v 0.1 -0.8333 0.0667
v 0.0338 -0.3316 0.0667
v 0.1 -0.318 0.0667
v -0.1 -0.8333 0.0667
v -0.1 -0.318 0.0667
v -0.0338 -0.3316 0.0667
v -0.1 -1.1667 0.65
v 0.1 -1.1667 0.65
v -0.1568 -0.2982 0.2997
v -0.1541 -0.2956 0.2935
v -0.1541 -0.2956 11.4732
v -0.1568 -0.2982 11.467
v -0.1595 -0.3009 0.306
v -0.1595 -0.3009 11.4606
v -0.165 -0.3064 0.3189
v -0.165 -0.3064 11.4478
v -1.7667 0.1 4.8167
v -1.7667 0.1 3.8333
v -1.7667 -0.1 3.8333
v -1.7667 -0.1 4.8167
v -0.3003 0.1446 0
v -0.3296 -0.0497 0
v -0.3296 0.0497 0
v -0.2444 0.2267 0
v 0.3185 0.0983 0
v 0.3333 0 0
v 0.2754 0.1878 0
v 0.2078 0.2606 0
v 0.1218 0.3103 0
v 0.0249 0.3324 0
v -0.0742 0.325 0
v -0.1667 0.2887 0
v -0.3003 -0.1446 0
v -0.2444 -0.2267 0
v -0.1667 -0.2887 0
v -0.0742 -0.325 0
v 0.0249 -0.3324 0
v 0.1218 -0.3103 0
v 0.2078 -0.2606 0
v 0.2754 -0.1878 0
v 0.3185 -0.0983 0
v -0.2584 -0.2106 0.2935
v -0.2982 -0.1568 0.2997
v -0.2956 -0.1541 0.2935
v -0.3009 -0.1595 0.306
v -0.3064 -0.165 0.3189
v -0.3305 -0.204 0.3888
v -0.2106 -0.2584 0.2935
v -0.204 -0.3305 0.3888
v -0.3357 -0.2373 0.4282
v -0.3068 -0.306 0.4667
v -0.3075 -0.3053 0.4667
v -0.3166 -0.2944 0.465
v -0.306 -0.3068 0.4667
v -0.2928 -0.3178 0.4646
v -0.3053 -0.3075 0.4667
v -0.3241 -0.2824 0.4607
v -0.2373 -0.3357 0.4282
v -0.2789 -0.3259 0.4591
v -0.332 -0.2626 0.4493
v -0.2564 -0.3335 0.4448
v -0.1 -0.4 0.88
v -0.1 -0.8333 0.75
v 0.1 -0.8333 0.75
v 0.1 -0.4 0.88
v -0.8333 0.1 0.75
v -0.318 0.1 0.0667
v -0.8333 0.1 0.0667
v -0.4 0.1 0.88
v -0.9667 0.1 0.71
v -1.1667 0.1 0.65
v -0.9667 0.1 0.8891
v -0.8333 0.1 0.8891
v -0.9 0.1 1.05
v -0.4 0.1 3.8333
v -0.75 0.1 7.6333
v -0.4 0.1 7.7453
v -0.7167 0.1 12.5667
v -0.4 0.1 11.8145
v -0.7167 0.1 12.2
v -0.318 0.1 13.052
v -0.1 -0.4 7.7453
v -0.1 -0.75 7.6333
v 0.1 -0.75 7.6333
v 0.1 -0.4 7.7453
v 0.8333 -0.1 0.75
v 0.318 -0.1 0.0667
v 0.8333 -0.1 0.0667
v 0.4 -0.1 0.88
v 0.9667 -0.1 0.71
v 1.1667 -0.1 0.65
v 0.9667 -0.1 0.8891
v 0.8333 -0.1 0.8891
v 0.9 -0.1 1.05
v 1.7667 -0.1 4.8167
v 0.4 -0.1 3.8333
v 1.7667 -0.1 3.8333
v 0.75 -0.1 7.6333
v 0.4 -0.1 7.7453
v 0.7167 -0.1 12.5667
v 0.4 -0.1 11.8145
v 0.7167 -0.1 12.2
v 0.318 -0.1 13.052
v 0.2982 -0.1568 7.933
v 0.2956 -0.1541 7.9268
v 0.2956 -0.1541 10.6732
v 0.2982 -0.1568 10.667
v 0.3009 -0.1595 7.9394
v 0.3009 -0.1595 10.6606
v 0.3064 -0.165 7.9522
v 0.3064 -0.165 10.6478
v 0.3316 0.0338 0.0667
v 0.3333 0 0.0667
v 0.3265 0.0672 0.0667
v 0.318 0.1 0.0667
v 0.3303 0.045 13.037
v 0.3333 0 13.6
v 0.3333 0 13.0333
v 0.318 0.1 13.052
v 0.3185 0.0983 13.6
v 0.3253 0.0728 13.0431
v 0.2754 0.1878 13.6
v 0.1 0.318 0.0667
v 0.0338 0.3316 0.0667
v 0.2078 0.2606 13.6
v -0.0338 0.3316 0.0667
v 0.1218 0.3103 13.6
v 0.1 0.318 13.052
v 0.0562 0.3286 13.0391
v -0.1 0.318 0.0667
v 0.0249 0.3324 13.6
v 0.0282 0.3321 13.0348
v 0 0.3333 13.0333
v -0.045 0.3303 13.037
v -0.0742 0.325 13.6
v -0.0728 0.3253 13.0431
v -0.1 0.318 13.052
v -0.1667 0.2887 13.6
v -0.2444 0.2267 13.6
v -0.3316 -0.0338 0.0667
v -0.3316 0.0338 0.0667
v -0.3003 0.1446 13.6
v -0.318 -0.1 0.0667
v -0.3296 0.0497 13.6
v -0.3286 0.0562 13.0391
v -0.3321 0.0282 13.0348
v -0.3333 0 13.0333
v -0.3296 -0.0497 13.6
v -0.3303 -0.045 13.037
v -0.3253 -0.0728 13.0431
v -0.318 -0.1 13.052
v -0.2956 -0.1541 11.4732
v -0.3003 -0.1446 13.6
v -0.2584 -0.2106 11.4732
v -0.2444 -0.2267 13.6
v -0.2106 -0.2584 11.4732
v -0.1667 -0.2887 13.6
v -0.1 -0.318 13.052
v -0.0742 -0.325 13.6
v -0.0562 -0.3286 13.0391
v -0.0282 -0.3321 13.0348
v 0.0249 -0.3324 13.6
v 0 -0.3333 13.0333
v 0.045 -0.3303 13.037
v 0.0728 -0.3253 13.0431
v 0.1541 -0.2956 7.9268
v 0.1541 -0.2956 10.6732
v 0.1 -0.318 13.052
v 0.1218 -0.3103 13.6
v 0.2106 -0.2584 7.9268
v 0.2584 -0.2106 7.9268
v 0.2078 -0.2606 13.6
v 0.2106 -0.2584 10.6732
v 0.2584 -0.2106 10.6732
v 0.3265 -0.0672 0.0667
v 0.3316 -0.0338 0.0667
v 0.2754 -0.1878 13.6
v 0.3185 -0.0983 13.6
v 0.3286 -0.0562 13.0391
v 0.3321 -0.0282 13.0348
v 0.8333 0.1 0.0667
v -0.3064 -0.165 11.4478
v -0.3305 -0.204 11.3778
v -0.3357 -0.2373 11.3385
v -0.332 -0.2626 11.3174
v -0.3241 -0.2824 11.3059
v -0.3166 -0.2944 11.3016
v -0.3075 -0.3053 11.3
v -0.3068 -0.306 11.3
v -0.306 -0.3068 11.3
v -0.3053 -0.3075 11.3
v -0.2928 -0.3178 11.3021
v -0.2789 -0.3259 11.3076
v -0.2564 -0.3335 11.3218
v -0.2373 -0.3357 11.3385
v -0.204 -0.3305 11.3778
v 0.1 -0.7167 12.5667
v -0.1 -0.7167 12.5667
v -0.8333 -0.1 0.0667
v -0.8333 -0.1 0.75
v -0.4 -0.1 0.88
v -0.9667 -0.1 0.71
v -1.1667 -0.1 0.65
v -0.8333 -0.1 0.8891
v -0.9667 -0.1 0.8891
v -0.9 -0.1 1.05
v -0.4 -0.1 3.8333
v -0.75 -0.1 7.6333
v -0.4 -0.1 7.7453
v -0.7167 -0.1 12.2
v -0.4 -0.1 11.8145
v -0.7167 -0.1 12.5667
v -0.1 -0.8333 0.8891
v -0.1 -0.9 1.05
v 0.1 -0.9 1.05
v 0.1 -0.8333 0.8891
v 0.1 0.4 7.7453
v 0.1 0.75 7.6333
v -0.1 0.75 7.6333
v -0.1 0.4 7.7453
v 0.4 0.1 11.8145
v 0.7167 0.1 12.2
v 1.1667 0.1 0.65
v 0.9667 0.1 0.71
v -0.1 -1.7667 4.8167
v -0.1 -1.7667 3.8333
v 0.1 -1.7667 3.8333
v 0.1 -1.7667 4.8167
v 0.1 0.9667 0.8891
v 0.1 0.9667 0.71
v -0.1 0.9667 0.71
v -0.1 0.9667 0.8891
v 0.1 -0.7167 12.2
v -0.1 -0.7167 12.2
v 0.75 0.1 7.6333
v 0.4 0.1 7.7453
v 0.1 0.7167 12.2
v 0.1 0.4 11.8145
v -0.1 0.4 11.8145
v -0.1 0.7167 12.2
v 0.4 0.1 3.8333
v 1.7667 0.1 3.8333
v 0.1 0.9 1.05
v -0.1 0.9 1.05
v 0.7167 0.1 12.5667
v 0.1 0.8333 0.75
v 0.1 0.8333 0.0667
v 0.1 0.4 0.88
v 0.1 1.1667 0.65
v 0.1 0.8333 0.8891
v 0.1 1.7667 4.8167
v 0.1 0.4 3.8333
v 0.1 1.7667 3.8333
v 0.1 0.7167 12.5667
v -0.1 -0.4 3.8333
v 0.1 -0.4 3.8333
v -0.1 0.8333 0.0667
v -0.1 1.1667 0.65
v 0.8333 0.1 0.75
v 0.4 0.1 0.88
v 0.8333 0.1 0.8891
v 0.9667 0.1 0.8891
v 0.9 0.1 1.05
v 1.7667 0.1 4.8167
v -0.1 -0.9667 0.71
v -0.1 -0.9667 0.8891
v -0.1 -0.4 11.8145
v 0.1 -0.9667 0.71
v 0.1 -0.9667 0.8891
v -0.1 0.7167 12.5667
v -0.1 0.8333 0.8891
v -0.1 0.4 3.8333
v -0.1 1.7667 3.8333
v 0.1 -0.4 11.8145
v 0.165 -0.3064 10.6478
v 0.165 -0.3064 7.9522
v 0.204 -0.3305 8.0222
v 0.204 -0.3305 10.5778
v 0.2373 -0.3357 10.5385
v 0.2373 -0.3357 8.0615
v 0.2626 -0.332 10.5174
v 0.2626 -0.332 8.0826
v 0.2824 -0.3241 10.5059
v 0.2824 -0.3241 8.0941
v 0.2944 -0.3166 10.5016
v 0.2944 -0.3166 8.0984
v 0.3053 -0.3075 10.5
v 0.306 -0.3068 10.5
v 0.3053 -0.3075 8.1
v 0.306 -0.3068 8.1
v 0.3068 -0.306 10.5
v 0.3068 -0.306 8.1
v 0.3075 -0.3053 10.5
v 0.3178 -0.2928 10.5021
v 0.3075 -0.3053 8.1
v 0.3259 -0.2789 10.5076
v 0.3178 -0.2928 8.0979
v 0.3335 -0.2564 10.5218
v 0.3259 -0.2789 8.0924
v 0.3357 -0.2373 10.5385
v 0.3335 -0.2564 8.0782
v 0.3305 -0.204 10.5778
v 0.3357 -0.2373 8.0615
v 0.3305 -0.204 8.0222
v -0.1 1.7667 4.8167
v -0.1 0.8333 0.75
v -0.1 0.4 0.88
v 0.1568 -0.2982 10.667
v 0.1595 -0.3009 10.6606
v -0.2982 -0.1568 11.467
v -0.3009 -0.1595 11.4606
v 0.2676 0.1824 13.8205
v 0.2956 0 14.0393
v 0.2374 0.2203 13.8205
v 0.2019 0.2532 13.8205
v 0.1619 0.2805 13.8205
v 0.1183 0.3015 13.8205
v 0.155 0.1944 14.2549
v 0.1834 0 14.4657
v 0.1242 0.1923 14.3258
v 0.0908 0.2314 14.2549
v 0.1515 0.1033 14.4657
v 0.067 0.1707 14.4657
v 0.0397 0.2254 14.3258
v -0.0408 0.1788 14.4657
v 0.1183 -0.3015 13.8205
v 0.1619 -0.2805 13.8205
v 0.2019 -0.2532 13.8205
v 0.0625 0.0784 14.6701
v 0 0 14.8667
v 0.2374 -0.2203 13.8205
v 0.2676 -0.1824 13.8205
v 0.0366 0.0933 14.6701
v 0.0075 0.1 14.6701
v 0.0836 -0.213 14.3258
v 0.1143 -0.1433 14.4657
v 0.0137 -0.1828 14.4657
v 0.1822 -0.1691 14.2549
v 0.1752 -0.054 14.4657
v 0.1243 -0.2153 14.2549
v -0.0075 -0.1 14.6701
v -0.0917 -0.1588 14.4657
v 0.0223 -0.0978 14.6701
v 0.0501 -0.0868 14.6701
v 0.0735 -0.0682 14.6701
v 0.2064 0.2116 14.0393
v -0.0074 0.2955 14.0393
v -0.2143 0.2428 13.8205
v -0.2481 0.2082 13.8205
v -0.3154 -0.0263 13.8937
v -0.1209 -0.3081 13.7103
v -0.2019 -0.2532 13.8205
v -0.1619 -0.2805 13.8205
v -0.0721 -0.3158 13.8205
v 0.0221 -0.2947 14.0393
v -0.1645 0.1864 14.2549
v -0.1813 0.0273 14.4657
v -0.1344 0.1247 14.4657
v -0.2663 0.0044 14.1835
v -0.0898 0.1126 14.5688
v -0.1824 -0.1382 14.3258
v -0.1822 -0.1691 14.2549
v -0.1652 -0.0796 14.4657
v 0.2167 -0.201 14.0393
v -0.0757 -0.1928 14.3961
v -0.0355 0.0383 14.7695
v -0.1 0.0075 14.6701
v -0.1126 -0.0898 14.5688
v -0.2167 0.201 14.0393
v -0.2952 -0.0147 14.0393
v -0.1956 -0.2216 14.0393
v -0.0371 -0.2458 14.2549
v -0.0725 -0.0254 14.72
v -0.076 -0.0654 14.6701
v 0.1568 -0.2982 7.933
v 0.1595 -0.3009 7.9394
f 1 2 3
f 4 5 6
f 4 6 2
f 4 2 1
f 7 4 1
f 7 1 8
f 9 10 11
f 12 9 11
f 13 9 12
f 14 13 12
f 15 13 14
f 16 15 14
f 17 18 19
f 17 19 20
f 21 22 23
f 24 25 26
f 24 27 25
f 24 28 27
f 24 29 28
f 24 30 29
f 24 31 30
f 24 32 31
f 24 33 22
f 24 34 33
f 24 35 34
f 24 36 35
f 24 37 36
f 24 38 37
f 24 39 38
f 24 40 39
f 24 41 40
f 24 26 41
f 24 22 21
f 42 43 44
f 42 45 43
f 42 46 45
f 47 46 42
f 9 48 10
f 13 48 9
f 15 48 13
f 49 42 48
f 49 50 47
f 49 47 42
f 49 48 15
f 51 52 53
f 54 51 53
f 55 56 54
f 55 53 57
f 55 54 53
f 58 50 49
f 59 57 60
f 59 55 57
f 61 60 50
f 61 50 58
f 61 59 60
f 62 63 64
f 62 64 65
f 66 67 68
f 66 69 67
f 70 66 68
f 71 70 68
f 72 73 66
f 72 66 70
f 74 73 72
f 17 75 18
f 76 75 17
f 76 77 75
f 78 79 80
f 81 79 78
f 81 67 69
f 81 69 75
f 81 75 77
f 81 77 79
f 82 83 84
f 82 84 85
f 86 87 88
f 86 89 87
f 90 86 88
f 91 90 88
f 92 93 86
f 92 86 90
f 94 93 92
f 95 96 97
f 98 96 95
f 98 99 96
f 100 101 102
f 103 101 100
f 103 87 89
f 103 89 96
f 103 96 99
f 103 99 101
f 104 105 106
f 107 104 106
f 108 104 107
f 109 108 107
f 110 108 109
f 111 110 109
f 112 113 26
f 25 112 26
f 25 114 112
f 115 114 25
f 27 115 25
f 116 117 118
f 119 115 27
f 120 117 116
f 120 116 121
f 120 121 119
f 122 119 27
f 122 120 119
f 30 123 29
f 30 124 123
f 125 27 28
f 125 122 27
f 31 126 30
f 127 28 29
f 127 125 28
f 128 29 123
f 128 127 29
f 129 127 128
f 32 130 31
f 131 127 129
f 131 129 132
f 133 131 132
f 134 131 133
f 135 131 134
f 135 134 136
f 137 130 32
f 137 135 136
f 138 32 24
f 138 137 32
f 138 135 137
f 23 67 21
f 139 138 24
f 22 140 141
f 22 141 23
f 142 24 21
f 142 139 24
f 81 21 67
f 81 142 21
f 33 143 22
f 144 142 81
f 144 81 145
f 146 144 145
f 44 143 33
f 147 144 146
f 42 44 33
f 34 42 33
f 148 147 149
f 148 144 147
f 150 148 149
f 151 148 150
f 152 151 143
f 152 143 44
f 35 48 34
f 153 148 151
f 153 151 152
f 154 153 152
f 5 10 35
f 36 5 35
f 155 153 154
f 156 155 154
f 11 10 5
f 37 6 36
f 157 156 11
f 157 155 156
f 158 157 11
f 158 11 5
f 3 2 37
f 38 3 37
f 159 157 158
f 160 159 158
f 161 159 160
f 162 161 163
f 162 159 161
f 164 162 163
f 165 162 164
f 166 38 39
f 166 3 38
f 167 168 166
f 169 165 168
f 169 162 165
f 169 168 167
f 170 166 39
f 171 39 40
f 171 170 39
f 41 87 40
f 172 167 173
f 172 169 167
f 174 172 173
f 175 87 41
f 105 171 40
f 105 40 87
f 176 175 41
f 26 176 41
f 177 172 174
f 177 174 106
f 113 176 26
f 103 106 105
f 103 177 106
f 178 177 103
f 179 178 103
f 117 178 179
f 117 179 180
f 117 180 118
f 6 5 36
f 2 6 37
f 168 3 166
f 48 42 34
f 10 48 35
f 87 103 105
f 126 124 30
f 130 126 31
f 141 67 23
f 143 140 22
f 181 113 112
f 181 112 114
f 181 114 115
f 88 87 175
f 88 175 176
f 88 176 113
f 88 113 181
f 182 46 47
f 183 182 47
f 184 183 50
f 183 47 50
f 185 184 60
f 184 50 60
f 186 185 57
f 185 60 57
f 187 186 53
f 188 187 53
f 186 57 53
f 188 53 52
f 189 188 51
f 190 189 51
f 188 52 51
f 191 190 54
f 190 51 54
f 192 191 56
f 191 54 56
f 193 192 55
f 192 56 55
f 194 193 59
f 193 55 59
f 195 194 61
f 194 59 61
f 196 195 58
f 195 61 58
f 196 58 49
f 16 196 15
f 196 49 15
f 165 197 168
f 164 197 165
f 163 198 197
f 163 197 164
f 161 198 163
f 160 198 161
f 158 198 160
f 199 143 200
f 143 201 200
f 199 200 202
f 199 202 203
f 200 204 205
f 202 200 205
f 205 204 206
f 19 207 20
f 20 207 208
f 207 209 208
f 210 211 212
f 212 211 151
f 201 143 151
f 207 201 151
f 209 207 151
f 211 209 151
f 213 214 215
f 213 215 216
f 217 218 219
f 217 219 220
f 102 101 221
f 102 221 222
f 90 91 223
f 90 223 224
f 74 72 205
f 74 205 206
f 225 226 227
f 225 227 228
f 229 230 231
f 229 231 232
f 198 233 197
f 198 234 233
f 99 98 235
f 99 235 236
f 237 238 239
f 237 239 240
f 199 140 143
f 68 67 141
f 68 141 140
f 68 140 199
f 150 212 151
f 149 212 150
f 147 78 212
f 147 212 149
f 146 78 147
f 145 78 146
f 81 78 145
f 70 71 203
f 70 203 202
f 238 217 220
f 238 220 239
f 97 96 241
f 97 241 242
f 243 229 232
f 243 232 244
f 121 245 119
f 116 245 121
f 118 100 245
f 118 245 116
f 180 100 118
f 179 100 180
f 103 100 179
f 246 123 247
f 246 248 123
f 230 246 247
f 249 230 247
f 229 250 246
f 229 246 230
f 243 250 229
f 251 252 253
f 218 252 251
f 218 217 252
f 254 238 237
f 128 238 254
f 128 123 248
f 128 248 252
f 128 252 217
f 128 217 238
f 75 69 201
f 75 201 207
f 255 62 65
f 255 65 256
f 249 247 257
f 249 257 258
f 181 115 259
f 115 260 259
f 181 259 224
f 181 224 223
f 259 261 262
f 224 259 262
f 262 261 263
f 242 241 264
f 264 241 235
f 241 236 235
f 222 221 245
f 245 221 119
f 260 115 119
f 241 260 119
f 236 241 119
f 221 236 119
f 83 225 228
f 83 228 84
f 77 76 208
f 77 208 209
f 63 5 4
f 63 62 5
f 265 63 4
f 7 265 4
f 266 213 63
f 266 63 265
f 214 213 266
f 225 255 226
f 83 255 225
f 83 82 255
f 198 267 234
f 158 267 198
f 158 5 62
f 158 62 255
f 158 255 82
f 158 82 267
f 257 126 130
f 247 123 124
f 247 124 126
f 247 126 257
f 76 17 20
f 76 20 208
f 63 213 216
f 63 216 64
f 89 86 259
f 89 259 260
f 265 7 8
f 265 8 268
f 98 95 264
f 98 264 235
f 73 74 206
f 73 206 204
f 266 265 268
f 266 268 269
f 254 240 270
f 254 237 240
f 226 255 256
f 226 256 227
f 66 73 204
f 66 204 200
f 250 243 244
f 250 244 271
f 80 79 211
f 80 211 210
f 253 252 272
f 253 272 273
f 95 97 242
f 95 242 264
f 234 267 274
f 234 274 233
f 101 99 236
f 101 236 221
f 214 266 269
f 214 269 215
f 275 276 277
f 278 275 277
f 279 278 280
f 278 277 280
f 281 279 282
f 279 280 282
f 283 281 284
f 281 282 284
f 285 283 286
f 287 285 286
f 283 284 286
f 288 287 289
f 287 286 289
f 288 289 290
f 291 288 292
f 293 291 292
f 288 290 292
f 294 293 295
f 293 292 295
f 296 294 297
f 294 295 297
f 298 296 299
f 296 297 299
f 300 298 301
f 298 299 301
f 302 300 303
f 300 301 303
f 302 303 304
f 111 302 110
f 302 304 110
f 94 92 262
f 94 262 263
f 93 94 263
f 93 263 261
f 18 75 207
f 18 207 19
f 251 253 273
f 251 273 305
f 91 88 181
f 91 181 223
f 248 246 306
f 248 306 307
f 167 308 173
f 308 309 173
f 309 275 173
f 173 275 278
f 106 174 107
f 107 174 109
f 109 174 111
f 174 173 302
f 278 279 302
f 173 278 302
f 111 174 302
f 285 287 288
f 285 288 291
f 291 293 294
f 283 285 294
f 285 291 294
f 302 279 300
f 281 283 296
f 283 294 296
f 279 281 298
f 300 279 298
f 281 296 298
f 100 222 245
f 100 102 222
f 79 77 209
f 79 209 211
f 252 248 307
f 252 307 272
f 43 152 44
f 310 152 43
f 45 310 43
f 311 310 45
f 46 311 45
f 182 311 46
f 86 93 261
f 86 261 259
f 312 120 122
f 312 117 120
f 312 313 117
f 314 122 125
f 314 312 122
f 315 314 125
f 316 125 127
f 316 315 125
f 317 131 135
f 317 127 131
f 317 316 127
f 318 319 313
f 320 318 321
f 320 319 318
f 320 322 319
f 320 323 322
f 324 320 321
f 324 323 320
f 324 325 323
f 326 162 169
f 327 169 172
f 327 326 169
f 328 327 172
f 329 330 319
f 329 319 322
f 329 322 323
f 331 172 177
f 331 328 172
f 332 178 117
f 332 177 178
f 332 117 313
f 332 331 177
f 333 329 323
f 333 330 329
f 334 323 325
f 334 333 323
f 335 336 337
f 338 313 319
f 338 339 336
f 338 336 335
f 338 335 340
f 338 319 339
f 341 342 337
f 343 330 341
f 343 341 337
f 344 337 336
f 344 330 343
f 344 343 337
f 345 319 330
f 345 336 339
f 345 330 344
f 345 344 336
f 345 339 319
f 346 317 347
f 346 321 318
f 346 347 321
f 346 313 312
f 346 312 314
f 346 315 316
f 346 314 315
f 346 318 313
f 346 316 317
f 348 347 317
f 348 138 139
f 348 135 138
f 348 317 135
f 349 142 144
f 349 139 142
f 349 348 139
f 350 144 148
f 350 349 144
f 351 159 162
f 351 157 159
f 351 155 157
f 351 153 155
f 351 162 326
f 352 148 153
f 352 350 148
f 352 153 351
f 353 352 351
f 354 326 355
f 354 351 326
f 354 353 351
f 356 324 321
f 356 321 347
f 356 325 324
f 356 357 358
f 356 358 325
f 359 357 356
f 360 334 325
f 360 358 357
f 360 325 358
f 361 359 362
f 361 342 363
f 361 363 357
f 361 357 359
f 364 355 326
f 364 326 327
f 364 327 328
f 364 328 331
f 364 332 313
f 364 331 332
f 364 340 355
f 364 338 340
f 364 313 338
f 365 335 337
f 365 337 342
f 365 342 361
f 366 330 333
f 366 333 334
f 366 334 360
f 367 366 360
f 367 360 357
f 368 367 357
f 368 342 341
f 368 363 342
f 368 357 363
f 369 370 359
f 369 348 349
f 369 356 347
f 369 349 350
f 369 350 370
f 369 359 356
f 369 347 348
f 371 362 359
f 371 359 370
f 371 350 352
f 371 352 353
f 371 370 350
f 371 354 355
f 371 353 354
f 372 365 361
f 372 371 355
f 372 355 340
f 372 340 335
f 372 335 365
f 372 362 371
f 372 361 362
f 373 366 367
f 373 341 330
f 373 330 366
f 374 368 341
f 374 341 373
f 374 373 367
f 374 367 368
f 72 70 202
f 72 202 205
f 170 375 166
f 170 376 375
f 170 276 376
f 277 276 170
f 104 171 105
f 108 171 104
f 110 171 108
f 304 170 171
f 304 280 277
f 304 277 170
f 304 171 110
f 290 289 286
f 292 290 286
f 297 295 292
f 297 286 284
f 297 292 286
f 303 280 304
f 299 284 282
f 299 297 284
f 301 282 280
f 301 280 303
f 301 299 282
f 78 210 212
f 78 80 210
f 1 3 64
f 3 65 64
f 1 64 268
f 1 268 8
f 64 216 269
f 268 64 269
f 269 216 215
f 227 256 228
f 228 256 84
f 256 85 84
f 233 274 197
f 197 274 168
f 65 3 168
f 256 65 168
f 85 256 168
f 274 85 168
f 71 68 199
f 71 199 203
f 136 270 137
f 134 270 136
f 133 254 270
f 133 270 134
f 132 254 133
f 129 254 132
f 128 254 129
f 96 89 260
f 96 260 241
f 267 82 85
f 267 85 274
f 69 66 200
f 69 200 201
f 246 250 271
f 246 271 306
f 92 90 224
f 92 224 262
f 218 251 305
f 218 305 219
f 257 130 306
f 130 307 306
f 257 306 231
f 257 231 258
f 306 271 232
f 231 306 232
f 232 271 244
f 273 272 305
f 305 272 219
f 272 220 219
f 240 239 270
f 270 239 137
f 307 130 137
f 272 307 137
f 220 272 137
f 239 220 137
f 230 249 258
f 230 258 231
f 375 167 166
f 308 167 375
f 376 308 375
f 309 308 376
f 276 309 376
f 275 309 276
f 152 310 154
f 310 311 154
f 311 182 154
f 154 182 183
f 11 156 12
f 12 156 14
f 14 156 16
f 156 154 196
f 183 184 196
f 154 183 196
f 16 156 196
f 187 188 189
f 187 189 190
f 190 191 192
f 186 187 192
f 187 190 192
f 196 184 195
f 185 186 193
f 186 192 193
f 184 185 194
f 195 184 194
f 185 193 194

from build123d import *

# Parameters (mm, degrees)
F4_DEPTH  = 0.1
F5_COUNT  = 4
F8_DEPTH  = 10.8333333333
F11_DEPTH = 2.4
F12_SIZE2 = 0.09999
F12_SIZE  = 0.173195


# Not quite as in the source:
# - a fillet or chamfer is up to 0.001 mm smaller than in the source, because OpenCascade refuses the exact size


with BuildPart() as f2:
    # F1 (on Front) → F2 (revolve)
    with BuildSketch(Plane.XZ):
        with BuildLine():
            Line((0, 14.8666666667), (0, 0))
            Line((0, 0), (0.3333333333, 0))
            Line((0.3333333333, 0), (0.3333333333, 13.6))
            ThreePointArc((0.3333333333, 13.6), (0.2486051426, 14.2548960901), (0, 14.8666666667))
        make_face()
    revolve(axis=Axis((0, 0, 7.4333333333), (0, 0, 1)))

    # F3 (on Front) → F4 (join, symmetric)
    with BuildSketch(Plane.XZ):
        Polygon((0, 13.4391304348), (0, 0.0666666667), (0.8333333333, 0.0666666667), (1.1666666667, 0.65), (0.9666666667, 0.71), (0.8333333333, 0.75), (0.4, 0.88), (0.4, 3.8333333333), (1.7666666667, 3.8333333333), (1.7666666667, 4.8166666667), (0.75, 7.6333333333), (0.4, 7.7453333333), (0.4, 11.8144927536), (0.7166666667, 12.2), (0.7166666667, 12.5666666667), align=None)
        Polygon((0.8333333333, 0.75), (0.9666666667, 0.71), (0.9666666667, 0.8890524292), (0.9, 1.05), (0.8333333333, 0.8890524292), align=None)
    extrude(amount=F4_DEPTH, both=True)

    # F5: F2 ×4 about axis
    f5_axis = Axis((0, 0, 0), (0, 0, 1))


with BuildPart() as f2_1:
    add(f2.part)
    for i in range(1, F5_COUNT):
        add(f2.part.rotate(f5_axis, i * 360 / F5_COUNT))

    # F7 (on offset) → F8 (join)
    with BuildSketch(Plane.XY.offset(0.4666666667)):
        with BuildLine():
            Line((-0.1110620592, 0.030359297), (-0.3064129385, -0.1649915823))
            ThreePointArc((-0.3064129385, -0.1649915823), (-0.3064129385, -0.3064129385), (-0.1649915823, -0.3064129385))
            Line((-0.1649915823, -0.3064129385), (0.030359297, -0.1110620592))
            Line((0.030359297, -0.1110620592), (-0.1110620592, 0.030359297))
        make_face()
    extrude(amount=F8_DEPTH)

    # F10 (on offset) → F11 (join)
    with BuildSketch(Plane.XY.offset(8.1)):
        with BuildLine():
            Line((0.1737662231, -0.0323448669), (0.0323448669, -0.1737662231))
            Line((0.0323448669, -0.1737662231), (0.1649915823, -0.3064129385))
            ThreePointArc((0.1649915823, -0.3064129385), (0.3064129385, -0.3064129385), (0.3064129385, -0.1649915823))
            Line((0.3064129385, -0.1649915823), (0.1737662231, -0.0323448669))
        make_face()
    extrude(amount=F11_DEPTH)

    # F12 (call 1 of 4: OpenCascade refuses the feature's edges together) (size 0.1732050808 and 0.1 in the source; OpenCascade refuses exactly that, so slightly less here)
    f12_edges = [f2_1.edges().sort_by_distance(p)[0] for p in [
        (-0.235702, -0.235702, 11.3),
    ]]
    f12_side = f2_1.faces().sort_by_distance((-0.333333, 0, 0.013633))[0]
    chamfer(f12_edges, length=F12_SIZE, length2=F12_SIZE2, reference=f12_side)

    # F12#2 (call 2 of 4) (size 0.1732050808 and 0.1 in the source; OpenCascade refuses exactly that, so slightly less here)
    f12_2_edges = [f2_1.edges().sort_by_distance(p)[0] for p in [
        (-0.235702, -0.235702, 0.466667),
    ]]
    f12_2_side = f2_1.faces().sort_by_distance((-0.333333, 0, 0.013633))[0]
    chamfer(f12_2_edges, length=F12_SIZE, length2=F12_SIZE2, reference=f12_2_side)

    # F12#3 (call 3 of 4) (size 0.1732050808 and 0.1 in the source; OpenCascade refuses exactly that, so slightly less here)
    f12_3_edges = [f2_1.edges().sort_by_distance(p)[0] for p in [
        (0.235702, -0.235702, 8.1),
    ]]
    f12_3_side = f2_1.faces().sort_by_distance((-0.333333, 0, 0.013633))[0]
    chamfer(f12_3_edges, length=F12_SIZE, length2=F12_SIZE2, reference=f12_3_side)

    # F12#4 (call 4 of 4) (size 0.1732050808 and 0.1 in the source; OpenCascade refuses exactly that, so slightly less here)
    f12_4_edges = [f2_1.edges().sort_by_distance(p)[0] for p in [
        (0.235702, -0.235702, 10.5),
    ]]
    f12_4_side = f2_1.faces().sort_by_distance((-0.333333, 0, 0.013633))[0]
    chamfer(f12_4_edges, length=F12_SIZE, length2=F12_SIZE2, reference=f12_4_side)


solid = f2_1.part
